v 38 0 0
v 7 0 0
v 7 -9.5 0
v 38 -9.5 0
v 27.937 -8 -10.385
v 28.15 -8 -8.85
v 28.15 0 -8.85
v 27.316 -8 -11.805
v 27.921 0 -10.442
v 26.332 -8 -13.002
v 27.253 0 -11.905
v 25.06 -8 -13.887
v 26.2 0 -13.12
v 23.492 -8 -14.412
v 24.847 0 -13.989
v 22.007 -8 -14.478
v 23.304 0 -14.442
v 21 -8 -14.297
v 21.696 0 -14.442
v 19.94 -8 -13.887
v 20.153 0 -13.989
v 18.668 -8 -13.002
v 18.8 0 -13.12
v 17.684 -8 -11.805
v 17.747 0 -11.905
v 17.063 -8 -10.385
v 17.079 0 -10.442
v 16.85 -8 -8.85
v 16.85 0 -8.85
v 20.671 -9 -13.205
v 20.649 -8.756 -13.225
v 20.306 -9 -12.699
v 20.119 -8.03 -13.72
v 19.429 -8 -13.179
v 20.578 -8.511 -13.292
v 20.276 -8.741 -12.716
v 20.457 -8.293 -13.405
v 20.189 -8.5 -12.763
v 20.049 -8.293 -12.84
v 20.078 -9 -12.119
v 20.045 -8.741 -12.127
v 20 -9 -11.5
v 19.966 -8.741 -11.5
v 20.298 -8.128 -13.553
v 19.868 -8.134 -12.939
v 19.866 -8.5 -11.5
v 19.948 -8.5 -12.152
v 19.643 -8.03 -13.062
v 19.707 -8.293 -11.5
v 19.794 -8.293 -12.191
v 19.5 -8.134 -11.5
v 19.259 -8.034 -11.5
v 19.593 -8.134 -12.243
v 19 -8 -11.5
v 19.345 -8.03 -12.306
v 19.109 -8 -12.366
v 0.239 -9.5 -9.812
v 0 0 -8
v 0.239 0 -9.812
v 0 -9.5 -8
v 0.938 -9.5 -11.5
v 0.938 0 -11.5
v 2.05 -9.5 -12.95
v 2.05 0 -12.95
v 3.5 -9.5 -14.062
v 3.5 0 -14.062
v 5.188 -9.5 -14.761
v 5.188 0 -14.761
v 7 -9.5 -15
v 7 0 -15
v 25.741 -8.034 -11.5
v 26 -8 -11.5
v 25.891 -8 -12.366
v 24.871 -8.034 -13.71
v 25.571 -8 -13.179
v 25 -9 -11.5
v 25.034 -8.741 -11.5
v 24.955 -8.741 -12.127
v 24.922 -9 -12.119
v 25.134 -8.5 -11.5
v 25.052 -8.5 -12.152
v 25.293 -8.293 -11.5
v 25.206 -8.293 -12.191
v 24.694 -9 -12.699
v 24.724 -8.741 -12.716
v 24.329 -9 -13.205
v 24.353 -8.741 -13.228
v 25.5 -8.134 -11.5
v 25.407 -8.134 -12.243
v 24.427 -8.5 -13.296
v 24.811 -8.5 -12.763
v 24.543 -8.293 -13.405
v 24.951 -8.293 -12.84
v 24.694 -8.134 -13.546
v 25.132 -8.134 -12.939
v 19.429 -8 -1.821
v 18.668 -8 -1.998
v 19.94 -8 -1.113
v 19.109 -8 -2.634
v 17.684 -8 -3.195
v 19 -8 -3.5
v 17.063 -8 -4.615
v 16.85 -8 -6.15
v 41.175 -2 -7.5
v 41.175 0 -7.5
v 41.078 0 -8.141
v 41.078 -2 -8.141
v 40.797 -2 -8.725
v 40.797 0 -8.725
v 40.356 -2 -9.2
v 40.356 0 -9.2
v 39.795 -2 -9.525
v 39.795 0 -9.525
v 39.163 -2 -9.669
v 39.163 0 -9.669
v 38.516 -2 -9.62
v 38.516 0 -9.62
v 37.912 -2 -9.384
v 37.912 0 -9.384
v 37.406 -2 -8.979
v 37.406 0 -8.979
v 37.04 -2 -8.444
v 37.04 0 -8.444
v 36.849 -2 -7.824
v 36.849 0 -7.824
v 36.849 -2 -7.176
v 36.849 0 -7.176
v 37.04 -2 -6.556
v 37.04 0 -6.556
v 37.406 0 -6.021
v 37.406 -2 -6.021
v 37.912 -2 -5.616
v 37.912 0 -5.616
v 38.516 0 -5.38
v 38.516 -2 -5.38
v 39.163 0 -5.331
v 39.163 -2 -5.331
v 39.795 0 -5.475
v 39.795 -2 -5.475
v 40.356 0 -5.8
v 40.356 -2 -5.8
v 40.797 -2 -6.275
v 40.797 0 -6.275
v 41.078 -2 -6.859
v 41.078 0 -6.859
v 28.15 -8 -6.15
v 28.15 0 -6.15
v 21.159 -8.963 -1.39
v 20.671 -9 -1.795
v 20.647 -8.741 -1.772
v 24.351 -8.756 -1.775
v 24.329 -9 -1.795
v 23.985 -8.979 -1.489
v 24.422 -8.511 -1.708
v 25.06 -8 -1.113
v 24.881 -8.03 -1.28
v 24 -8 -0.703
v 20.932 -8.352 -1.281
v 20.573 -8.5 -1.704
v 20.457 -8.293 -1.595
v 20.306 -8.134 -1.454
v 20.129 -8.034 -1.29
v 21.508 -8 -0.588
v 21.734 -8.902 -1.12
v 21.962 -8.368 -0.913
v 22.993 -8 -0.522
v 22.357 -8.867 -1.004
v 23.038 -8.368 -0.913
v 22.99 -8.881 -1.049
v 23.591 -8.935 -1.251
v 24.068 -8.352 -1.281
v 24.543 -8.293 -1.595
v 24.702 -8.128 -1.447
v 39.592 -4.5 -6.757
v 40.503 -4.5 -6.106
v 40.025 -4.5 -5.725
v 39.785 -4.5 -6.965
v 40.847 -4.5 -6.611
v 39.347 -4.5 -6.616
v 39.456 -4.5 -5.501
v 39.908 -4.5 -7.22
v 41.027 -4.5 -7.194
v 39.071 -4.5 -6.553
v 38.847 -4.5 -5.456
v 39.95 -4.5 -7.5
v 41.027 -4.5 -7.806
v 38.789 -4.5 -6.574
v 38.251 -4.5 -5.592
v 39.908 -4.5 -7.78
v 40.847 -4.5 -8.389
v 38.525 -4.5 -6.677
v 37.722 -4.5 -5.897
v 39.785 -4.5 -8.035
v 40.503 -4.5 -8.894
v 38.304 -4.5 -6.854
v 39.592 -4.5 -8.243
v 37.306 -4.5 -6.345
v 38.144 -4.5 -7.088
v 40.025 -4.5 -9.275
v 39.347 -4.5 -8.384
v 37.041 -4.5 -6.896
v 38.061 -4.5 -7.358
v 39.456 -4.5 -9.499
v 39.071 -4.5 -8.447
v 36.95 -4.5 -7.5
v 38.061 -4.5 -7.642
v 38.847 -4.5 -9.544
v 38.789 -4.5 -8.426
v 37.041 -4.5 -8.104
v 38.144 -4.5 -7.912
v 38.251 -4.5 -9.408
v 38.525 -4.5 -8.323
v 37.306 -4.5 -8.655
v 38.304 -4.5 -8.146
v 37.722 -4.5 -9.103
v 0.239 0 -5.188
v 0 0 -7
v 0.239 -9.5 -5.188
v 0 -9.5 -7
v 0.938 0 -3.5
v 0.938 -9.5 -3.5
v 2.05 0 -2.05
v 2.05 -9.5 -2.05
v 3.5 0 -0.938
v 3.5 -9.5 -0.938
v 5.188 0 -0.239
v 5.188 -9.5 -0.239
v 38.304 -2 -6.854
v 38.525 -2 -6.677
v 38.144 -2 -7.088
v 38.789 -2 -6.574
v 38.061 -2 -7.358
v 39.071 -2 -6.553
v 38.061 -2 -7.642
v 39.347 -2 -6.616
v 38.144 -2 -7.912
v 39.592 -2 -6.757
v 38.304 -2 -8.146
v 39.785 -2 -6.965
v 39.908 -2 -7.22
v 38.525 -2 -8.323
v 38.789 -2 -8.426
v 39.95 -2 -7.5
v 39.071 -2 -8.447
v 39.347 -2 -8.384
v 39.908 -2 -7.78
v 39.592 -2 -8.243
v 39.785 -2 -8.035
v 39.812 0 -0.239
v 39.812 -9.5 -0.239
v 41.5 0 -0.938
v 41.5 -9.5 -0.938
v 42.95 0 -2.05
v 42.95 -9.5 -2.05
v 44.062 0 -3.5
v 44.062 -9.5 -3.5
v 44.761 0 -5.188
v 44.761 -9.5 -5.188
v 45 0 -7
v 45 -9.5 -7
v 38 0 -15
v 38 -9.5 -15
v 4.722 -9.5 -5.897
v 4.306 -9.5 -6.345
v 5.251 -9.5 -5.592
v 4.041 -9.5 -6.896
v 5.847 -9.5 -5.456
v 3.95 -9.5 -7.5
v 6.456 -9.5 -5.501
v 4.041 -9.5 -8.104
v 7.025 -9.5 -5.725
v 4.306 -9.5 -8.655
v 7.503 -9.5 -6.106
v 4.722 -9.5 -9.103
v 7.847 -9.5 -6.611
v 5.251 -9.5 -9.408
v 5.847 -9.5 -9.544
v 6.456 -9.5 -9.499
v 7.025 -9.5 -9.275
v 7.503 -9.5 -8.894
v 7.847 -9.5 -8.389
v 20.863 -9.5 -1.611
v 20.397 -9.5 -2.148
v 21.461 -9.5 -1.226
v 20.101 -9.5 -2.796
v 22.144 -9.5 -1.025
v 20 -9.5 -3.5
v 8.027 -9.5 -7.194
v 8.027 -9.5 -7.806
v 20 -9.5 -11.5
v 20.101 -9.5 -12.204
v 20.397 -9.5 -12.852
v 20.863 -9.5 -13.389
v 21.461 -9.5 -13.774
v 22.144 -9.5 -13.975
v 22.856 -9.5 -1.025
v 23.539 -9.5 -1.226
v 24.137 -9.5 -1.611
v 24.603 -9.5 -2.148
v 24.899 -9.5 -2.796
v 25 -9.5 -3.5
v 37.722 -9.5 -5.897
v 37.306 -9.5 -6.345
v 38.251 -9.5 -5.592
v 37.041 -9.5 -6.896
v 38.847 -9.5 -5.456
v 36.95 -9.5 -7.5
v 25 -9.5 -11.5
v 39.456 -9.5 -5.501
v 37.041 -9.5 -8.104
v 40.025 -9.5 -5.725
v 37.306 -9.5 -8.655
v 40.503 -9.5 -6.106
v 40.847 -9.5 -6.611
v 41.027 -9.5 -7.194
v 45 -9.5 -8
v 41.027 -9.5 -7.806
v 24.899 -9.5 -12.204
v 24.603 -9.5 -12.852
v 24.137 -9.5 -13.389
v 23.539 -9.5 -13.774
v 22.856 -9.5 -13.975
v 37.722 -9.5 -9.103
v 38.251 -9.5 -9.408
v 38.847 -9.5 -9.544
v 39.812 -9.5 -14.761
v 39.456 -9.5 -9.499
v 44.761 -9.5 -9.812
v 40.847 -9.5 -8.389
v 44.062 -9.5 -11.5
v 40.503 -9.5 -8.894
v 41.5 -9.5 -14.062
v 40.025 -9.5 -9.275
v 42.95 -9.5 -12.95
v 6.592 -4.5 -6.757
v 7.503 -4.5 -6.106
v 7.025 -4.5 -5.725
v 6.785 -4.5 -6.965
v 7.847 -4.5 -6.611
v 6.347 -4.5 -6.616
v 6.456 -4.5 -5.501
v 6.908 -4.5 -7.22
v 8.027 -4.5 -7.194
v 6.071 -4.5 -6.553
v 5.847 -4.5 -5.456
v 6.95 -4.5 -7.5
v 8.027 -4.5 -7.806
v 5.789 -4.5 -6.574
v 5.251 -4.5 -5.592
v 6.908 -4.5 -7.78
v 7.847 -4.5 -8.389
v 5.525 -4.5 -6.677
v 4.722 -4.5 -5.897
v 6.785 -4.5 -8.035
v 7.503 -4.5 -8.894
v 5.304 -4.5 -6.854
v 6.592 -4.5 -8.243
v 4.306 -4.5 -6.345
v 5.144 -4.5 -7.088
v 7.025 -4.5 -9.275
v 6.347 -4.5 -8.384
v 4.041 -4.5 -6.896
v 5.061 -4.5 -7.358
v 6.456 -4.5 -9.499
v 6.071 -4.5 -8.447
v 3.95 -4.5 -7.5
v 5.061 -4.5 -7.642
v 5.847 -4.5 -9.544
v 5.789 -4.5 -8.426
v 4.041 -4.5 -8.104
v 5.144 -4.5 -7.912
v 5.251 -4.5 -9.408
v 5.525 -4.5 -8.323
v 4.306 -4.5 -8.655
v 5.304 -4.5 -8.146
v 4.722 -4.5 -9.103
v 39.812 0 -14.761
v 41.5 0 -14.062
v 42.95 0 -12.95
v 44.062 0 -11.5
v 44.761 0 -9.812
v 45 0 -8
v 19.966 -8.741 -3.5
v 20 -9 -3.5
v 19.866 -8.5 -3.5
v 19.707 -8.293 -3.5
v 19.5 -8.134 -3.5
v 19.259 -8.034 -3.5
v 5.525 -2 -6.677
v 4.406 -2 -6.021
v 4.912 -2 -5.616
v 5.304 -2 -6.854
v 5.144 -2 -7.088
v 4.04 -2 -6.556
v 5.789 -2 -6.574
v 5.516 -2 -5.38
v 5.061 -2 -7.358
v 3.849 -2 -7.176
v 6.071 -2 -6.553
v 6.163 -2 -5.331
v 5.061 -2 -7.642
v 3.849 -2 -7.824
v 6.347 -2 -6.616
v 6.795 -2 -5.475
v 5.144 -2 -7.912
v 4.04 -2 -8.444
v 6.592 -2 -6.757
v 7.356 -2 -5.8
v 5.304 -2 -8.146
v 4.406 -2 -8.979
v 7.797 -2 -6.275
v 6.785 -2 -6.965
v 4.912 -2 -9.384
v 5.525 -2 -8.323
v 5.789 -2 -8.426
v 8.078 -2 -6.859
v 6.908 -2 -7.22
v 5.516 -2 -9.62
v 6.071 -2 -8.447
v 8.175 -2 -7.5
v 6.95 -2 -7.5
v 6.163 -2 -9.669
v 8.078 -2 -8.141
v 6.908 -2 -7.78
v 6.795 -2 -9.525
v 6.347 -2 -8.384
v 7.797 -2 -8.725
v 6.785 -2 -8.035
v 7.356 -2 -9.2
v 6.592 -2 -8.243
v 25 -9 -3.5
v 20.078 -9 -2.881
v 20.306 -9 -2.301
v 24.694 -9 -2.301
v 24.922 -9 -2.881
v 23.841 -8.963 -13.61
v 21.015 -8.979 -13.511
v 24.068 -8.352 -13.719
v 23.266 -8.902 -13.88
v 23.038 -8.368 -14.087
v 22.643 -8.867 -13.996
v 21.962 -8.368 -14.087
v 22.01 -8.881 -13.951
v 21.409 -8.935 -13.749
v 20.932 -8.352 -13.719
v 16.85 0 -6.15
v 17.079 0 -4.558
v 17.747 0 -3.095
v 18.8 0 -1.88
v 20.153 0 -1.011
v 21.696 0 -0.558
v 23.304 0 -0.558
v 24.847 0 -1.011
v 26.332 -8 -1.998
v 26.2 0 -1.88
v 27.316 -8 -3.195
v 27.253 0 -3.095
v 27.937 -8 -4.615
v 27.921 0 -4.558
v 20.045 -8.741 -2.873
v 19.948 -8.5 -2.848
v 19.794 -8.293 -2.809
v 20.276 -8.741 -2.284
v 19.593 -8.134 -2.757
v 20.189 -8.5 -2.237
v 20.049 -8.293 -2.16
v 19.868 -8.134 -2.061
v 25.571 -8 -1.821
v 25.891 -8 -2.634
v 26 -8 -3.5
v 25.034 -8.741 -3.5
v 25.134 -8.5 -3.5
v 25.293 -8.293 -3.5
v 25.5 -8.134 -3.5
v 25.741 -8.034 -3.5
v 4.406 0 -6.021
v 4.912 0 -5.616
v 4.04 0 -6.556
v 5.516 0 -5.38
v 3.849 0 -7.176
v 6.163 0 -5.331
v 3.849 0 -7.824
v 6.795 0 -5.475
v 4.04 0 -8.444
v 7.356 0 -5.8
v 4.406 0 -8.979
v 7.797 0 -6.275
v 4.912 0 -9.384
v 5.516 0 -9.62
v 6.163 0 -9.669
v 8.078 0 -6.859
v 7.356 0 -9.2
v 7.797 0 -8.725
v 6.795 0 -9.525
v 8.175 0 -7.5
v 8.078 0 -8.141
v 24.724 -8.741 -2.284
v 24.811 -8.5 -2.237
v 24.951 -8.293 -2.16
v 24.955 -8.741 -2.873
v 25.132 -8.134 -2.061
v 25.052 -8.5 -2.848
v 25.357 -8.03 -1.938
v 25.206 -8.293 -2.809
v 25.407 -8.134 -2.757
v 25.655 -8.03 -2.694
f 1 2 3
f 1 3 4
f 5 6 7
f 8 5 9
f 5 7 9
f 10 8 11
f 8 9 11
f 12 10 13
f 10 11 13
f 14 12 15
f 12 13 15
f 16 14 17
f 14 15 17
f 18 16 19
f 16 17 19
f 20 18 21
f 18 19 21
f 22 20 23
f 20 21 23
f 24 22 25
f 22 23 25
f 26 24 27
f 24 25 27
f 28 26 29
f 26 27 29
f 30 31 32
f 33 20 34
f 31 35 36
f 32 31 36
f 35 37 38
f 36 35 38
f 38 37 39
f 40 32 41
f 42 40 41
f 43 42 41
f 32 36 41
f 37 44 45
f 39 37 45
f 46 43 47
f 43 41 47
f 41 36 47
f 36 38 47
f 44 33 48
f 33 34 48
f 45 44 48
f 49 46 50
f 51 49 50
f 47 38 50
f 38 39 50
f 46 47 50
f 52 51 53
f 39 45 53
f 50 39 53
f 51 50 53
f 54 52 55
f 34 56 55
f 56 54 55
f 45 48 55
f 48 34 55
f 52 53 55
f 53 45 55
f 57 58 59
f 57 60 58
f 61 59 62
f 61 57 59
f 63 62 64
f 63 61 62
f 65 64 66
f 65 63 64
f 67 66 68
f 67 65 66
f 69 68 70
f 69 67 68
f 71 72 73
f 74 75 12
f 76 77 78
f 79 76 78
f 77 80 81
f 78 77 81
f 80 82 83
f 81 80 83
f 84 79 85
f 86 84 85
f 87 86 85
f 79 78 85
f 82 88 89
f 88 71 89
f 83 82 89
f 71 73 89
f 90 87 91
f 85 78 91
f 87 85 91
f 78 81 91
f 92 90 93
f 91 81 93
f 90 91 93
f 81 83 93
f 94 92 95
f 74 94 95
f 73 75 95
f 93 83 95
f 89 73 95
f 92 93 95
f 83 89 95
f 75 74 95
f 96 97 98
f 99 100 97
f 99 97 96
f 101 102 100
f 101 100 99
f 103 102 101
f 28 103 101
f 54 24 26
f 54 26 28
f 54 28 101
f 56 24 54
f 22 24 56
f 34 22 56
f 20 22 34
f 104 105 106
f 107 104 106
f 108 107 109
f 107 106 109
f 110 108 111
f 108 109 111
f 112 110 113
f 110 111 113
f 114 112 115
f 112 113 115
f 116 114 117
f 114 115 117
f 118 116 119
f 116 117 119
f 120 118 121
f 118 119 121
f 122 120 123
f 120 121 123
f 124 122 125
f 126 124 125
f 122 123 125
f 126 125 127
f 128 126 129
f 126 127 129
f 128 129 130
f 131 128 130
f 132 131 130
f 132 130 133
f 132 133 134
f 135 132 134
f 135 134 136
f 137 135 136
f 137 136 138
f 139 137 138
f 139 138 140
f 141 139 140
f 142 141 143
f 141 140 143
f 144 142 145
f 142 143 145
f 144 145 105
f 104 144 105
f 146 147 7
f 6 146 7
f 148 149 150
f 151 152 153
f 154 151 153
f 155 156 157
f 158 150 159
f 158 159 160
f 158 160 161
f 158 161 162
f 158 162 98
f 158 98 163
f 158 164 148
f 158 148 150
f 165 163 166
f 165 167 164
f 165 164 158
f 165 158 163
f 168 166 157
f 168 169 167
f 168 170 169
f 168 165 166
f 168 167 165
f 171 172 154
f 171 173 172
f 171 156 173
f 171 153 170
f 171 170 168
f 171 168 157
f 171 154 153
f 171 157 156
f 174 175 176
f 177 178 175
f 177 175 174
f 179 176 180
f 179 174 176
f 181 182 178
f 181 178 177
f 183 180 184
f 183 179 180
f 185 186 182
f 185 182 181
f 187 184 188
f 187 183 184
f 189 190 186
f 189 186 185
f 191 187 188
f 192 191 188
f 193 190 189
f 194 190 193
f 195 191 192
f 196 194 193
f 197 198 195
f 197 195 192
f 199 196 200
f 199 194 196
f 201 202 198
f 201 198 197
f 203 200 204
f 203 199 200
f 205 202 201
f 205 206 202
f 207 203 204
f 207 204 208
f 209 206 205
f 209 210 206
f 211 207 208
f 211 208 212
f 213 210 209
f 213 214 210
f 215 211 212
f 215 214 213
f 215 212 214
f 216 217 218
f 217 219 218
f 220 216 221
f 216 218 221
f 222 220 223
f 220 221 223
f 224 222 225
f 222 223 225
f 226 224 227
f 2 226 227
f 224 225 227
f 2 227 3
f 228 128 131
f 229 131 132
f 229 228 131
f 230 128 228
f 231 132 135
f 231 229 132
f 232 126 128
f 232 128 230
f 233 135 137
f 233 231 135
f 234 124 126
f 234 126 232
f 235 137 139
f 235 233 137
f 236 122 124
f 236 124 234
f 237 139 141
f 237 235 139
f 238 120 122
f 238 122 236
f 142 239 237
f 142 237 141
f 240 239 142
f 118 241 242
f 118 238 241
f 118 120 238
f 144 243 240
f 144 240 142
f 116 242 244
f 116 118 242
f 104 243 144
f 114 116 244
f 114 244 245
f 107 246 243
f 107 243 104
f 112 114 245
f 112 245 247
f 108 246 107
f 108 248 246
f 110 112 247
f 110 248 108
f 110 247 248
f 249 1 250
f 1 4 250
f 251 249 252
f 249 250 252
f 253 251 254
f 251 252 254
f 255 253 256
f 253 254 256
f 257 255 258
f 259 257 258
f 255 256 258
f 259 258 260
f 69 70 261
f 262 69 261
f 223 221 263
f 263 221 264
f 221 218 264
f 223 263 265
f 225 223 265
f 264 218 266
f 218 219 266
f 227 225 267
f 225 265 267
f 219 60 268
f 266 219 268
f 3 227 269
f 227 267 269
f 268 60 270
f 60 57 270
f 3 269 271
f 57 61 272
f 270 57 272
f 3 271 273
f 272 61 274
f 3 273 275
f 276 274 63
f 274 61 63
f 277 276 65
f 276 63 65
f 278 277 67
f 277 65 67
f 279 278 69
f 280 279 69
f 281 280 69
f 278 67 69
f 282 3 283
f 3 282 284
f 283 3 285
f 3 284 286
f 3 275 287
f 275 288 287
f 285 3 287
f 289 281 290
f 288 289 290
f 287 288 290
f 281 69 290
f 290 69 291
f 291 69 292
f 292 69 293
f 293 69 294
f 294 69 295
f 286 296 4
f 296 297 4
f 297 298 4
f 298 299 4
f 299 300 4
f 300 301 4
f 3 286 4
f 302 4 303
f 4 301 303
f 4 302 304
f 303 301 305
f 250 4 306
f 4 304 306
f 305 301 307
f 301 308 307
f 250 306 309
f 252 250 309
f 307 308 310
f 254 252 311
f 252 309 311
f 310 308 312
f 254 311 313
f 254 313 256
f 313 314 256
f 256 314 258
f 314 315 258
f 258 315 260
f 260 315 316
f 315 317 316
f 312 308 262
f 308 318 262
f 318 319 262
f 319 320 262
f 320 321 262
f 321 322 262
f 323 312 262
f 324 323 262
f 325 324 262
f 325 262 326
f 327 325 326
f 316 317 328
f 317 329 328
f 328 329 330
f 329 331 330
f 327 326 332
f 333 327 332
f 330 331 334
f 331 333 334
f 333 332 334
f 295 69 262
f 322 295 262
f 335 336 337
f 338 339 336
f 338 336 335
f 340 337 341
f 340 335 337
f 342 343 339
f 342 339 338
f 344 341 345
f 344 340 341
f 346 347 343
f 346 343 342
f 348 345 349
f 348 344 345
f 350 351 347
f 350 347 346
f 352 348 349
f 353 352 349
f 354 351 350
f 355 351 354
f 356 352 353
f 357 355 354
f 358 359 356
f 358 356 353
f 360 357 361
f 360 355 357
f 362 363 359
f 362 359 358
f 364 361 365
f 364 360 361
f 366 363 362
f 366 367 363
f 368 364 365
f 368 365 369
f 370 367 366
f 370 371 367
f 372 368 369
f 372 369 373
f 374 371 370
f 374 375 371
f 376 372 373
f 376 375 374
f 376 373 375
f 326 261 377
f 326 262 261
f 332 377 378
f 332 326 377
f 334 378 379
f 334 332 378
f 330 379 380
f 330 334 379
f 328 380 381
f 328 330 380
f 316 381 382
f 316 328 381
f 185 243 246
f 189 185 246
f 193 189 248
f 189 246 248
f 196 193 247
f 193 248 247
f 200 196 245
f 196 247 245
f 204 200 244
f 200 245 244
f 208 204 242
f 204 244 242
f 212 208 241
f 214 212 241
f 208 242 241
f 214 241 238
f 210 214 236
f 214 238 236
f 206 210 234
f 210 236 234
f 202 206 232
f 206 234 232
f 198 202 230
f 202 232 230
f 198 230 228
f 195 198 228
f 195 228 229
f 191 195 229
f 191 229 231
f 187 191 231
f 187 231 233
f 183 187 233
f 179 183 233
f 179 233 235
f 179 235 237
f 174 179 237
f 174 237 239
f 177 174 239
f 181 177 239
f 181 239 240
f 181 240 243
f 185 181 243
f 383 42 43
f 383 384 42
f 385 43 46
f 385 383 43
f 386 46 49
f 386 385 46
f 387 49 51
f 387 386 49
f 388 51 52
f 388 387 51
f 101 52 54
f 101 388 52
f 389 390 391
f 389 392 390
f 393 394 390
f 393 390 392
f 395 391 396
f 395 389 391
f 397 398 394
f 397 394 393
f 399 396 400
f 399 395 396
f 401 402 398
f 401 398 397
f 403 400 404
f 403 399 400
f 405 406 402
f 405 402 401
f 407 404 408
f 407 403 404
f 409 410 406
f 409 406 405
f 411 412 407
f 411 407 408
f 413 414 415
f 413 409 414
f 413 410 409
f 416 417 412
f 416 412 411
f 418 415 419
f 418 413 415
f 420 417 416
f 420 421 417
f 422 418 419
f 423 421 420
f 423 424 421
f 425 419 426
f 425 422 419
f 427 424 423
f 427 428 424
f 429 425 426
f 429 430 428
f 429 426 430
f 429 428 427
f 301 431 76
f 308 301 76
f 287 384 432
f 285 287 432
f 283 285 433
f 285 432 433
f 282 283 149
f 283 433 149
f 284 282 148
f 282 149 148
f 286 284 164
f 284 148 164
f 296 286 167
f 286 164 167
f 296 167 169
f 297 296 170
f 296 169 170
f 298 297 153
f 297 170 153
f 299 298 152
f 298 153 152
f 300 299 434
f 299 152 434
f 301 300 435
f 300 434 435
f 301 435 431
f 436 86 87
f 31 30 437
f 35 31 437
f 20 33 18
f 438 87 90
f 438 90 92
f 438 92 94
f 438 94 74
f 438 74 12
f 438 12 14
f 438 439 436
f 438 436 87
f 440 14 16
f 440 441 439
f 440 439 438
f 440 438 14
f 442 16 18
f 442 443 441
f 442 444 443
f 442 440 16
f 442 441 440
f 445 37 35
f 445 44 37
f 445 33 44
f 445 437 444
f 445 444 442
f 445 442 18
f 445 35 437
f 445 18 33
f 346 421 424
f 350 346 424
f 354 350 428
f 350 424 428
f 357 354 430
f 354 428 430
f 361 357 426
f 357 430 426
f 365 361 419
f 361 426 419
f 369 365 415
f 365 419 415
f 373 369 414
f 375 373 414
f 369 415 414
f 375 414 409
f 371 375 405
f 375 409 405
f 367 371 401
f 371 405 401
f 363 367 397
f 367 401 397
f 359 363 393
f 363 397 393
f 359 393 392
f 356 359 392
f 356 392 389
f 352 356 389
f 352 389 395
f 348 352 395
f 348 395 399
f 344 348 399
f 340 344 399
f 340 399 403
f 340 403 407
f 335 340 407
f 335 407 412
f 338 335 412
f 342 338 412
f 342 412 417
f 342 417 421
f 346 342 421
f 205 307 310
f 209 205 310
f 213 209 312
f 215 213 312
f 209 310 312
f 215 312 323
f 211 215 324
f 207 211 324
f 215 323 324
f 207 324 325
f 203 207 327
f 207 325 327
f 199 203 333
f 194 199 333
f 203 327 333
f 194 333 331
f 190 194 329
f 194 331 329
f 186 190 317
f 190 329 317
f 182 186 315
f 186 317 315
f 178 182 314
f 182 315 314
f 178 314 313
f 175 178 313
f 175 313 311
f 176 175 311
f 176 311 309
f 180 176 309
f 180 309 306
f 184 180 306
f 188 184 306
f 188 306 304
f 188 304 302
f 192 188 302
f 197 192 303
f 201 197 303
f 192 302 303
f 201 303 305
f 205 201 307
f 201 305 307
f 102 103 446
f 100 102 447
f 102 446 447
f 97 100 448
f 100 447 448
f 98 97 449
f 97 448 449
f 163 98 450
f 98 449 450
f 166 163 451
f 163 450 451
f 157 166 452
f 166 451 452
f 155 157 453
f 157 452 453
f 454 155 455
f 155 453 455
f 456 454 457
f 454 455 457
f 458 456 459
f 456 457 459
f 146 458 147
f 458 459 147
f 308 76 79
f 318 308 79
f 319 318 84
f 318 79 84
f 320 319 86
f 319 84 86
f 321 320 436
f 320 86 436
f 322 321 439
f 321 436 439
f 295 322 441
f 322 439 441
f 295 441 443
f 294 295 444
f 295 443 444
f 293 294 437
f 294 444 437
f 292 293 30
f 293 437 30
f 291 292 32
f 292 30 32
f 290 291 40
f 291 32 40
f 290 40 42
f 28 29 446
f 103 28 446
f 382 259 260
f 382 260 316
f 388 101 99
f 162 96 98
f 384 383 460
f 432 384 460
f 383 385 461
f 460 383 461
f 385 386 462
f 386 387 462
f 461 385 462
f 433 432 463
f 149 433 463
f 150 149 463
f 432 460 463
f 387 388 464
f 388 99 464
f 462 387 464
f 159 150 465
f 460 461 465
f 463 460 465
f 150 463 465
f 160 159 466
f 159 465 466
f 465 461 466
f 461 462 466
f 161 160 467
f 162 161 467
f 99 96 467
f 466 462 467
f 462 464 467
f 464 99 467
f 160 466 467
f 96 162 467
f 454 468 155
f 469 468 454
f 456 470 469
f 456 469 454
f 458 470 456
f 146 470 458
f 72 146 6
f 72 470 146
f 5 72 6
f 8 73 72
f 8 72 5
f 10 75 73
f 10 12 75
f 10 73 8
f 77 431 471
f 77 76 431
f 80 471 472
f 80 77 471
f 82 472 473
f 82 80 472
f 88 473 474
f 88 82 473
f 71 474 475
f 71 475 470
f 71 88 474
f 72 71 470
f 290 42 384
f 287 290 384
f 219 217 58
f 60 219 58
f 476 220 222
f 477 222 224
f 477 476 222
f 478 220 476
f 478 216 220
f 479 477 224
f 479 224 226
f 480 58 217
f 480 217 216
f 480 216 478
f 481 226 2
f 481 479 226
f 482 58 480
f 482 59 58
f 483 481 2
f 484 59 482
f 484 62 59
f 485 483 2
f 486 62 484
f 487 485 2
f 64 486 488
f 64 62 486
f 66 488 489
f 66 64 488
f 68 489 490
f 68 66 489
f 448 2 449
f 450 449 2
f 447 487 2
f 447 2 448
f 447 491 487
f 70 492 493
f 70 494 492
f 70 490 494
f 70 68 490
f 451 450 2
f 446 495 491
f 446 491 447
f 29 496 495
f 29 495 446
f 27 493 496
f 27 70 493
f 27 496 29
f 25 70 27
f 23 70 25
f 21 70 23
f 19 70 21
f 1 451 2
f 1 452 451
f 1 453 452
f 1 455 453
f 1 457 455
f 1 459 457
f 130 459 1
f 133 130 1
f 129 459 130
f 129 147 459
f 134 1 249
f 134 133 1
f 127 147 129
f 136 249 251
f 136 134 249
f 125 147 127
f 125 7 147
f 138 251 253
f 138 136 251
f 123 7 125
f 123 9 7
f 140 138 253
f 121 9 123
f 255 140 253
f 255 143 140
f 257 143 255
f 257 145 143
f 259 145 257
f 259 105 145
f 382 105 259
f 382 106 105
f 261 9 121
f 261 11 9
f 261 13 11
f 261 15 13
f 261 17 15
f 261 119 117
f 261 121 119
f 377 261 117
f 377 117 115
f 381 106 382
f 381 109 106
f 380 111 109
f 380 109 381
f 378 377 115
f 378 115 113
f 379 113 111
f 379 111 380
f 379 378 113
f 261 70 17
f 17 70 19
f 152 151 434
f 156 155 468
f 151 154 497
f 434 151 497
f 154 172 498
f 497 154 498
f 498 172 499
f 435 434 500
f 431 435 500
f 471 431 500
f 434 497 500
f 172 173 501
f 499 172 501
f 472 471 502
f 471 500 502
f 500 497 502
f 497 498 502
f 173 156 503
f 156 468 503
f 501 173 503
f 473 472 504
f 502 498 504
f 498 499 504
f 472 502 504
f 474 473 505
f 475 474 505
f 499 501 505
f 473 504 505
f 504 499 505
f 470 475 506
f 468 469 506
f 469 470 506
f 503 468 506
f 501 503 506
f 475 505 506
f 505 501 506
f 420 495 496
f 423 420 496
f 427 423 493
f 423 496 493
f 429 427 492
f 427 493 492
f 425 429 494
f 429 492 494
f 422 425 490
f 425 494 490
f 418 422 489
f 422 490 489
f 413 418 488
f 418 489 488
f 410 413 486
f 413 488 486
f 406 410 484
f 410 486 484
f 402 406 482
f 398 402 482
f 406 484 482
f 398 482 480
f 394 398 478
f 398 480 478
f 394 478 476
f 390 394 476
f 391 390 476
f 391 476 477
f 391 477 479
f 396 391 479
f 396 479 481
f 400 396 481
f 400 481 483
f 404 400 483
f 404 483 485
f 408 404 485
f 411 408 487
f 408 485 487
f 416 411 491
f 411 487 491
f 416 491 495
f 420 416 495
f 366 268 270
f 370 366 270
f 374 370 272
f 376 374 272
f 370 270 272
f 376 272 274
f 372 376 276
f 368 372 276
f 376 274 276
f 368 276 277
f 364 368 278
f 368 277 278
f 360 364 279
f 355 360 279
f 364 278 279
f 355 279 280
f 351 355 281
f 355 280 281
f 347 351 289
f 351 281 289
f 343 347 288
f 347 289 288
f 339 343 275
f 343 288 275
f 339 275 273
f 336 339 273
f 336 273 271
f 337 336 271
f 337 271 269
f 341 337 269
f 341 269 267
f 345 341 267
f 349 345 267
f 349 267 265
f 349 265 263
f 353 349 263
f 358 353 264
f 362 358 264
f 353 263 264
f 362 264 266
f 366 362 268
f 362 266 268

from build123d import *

# Parameters (mm, degrees)
SKETCH1_W           = 45
SKETCH1_H           = 15
BOSS_EXTRUDE1_DEPTH = 9.5
SKETCH2_R           = 5.5
CUT_EXTRUDE1_DEPTH  = 8
CUT_EXTRUDE6_DEPTH  = 8
CUT_EXTRUDE2_REACH  = 3.5
SKETCH4_R           = 2.175
CUT_EXTRUDE3_DEPTH  = 2
FILLET1_R           = 7
SKETCH5_R           = 2.05
CUT_EXTRUDE4_DEPTH  = 5
SKETCH6_R           = 0.95
CUT_EXTRUDE5_DEPTH  = 3
FILLET3_R           = 1


with BuildPart() as part:
    # Sketch1 → Boss-Extrude1 (new body)
    with BuildSketch(Plane(origin=(0, 0, 0), x_dir=(1, 0, 0), z_dir=(0, 1, 0))):
        with Locations((22.5, 7.5)):
            Rectangle(SKETCH1_W, SKETCH1_H)
    extrude(amount=-BOSS_EXTRUDE1_DEPTH)

    # Sketch2 → Cut-Extrude1 (cut)
    with BuildSketch(Plane(origin=(0, 0, 0), x_dir=(1, 0, 0), z_dir=(0, 1, 0))):
        with Locations((22.5, 8.82)):
            Circle(SKETCH2_R)
    extrude(amount=-CUT_EXTRUDE1_DEPTH, mode=Mode.SUBTRACT)

    # Sketch8 → Cut-Extrude6 (cut)
    with BuildSketch(Plane(origin=(0, 0, 0), x_dir=(1, 0, 0), z_dir=(0, 1, 0))):
        with BuildLine():
            Line((16.85, 8.85), (16.85, 6.15))
            ThreePointArc((16.85, 6.15), (22.5, 0.5), (28.15, 6.15))
            Line((28.15, 6.15), (28.15, 8.85))
            ThreePointArc((28.15, 8.85), (22.5, 14.5), (16.85, 8.85))
        make_face()
    extrude(amount=-CUT_EXTRUDE6_DEPTH, mode=Mode.SUBTRACT)

    # Sketch3 → Cut-Extrude2 (cut, up to next)
    with BuildSketch(Plane(origin=(0, -8, 0), x_dir=(1, 0, 0), z_dir=(0, 1, 0)), mode=Mode.PRIVATE) as cut_extrude2_sk1:
        with BuildLine():
            Line((20, 11.5), (20, 3.5))
            ThreePointArc((20, 3.5), (22.5, 1), (25, 3.5))
            Line((25, 3.5), (25, 11.5))
            ThreePointArc((25, 11.5), (22.5, 14), (20, 11.5))
        make_face()
    cut_extrude2_tool1 = extrude(cut_extrude2_sk1.sketch, amount=-CUT_EXTRUDE2_REACH, mode=Mode.PRIVATE) & part.part
    add(cut_extrude2_tool1.solids().sort_by_distance((22.5, -8, -7.5))[0], mode=Mode.SUBTRACT)

    # Sketch4 → Cut-Extrude3 (cut)
    with BuildSketch(Plane(origin=(0, 0, 0), x_dir=(1, 0, 0), z_dir=(0, 1, 0))):
        with Locations((6, 7.5)):
            Circle(SKETCH4_R)
        with Locations((39, 7.5)):
            Circle(SKETCH4_R)
    extrude(amount=-CUT_EXTRUDE3_DEPTH, mode=Mode.SUBTRACT)

    # Fillet1
    fillet1_edges = [part.edges().sort_by_distance(p)[0] for p in [
        (0, -4.75, -15),
        (45, -4.75, -15),
        (45, -4.75, 0),
        (0, -4.75, 0),
    ]]
    fillet(fillet1_edges, radius=FILLET1_R)

    # Sketch5 → Cut-Extrude4 (cut)
    with BuildSketch(Plane(origin=(0, -9.5, 0), x_dir=(-1, 0, 0), z_dir=(0, -1, 0))):
        with Locations((-39, 7.5)):
            Circle(SKETCH5_R)
        with Locations((-6, 7.5)):
            Circle(SKETCH5_R)
    extrude(amount=-CUT_EXTRUDE4_DEPTH, mode=Mode.SUBTRACT)

    # Sketch6 → Cut-Extrude5 (cut)
    with BuildSketch(Plane(origin=(0, -2, 0), x_dir=(1, 0, 0), z_dir=(0, 1, 0))):
        with Locations((6, 7.5)):
            Circle(SKETCH6_R)
        with Locations((39, 7.5)):
            Circle(SKETCH6_R)
    extrude(amount=-CUT_EXTRUDE5_DEPTH, mode=Mode.SUBTRACT)

    # Fillet3
    fillet3_edges = [part.edges().sort_by_distance(p)[0] for p in [
        (22.5, -8, -14),
        (20, -8, -7.5),
        (22.5, -8, -1),
        (25, -8, -7.5),
    ]]
    fillet(fillet3_edges, radius=FILLET3_R)


solid = part.part
